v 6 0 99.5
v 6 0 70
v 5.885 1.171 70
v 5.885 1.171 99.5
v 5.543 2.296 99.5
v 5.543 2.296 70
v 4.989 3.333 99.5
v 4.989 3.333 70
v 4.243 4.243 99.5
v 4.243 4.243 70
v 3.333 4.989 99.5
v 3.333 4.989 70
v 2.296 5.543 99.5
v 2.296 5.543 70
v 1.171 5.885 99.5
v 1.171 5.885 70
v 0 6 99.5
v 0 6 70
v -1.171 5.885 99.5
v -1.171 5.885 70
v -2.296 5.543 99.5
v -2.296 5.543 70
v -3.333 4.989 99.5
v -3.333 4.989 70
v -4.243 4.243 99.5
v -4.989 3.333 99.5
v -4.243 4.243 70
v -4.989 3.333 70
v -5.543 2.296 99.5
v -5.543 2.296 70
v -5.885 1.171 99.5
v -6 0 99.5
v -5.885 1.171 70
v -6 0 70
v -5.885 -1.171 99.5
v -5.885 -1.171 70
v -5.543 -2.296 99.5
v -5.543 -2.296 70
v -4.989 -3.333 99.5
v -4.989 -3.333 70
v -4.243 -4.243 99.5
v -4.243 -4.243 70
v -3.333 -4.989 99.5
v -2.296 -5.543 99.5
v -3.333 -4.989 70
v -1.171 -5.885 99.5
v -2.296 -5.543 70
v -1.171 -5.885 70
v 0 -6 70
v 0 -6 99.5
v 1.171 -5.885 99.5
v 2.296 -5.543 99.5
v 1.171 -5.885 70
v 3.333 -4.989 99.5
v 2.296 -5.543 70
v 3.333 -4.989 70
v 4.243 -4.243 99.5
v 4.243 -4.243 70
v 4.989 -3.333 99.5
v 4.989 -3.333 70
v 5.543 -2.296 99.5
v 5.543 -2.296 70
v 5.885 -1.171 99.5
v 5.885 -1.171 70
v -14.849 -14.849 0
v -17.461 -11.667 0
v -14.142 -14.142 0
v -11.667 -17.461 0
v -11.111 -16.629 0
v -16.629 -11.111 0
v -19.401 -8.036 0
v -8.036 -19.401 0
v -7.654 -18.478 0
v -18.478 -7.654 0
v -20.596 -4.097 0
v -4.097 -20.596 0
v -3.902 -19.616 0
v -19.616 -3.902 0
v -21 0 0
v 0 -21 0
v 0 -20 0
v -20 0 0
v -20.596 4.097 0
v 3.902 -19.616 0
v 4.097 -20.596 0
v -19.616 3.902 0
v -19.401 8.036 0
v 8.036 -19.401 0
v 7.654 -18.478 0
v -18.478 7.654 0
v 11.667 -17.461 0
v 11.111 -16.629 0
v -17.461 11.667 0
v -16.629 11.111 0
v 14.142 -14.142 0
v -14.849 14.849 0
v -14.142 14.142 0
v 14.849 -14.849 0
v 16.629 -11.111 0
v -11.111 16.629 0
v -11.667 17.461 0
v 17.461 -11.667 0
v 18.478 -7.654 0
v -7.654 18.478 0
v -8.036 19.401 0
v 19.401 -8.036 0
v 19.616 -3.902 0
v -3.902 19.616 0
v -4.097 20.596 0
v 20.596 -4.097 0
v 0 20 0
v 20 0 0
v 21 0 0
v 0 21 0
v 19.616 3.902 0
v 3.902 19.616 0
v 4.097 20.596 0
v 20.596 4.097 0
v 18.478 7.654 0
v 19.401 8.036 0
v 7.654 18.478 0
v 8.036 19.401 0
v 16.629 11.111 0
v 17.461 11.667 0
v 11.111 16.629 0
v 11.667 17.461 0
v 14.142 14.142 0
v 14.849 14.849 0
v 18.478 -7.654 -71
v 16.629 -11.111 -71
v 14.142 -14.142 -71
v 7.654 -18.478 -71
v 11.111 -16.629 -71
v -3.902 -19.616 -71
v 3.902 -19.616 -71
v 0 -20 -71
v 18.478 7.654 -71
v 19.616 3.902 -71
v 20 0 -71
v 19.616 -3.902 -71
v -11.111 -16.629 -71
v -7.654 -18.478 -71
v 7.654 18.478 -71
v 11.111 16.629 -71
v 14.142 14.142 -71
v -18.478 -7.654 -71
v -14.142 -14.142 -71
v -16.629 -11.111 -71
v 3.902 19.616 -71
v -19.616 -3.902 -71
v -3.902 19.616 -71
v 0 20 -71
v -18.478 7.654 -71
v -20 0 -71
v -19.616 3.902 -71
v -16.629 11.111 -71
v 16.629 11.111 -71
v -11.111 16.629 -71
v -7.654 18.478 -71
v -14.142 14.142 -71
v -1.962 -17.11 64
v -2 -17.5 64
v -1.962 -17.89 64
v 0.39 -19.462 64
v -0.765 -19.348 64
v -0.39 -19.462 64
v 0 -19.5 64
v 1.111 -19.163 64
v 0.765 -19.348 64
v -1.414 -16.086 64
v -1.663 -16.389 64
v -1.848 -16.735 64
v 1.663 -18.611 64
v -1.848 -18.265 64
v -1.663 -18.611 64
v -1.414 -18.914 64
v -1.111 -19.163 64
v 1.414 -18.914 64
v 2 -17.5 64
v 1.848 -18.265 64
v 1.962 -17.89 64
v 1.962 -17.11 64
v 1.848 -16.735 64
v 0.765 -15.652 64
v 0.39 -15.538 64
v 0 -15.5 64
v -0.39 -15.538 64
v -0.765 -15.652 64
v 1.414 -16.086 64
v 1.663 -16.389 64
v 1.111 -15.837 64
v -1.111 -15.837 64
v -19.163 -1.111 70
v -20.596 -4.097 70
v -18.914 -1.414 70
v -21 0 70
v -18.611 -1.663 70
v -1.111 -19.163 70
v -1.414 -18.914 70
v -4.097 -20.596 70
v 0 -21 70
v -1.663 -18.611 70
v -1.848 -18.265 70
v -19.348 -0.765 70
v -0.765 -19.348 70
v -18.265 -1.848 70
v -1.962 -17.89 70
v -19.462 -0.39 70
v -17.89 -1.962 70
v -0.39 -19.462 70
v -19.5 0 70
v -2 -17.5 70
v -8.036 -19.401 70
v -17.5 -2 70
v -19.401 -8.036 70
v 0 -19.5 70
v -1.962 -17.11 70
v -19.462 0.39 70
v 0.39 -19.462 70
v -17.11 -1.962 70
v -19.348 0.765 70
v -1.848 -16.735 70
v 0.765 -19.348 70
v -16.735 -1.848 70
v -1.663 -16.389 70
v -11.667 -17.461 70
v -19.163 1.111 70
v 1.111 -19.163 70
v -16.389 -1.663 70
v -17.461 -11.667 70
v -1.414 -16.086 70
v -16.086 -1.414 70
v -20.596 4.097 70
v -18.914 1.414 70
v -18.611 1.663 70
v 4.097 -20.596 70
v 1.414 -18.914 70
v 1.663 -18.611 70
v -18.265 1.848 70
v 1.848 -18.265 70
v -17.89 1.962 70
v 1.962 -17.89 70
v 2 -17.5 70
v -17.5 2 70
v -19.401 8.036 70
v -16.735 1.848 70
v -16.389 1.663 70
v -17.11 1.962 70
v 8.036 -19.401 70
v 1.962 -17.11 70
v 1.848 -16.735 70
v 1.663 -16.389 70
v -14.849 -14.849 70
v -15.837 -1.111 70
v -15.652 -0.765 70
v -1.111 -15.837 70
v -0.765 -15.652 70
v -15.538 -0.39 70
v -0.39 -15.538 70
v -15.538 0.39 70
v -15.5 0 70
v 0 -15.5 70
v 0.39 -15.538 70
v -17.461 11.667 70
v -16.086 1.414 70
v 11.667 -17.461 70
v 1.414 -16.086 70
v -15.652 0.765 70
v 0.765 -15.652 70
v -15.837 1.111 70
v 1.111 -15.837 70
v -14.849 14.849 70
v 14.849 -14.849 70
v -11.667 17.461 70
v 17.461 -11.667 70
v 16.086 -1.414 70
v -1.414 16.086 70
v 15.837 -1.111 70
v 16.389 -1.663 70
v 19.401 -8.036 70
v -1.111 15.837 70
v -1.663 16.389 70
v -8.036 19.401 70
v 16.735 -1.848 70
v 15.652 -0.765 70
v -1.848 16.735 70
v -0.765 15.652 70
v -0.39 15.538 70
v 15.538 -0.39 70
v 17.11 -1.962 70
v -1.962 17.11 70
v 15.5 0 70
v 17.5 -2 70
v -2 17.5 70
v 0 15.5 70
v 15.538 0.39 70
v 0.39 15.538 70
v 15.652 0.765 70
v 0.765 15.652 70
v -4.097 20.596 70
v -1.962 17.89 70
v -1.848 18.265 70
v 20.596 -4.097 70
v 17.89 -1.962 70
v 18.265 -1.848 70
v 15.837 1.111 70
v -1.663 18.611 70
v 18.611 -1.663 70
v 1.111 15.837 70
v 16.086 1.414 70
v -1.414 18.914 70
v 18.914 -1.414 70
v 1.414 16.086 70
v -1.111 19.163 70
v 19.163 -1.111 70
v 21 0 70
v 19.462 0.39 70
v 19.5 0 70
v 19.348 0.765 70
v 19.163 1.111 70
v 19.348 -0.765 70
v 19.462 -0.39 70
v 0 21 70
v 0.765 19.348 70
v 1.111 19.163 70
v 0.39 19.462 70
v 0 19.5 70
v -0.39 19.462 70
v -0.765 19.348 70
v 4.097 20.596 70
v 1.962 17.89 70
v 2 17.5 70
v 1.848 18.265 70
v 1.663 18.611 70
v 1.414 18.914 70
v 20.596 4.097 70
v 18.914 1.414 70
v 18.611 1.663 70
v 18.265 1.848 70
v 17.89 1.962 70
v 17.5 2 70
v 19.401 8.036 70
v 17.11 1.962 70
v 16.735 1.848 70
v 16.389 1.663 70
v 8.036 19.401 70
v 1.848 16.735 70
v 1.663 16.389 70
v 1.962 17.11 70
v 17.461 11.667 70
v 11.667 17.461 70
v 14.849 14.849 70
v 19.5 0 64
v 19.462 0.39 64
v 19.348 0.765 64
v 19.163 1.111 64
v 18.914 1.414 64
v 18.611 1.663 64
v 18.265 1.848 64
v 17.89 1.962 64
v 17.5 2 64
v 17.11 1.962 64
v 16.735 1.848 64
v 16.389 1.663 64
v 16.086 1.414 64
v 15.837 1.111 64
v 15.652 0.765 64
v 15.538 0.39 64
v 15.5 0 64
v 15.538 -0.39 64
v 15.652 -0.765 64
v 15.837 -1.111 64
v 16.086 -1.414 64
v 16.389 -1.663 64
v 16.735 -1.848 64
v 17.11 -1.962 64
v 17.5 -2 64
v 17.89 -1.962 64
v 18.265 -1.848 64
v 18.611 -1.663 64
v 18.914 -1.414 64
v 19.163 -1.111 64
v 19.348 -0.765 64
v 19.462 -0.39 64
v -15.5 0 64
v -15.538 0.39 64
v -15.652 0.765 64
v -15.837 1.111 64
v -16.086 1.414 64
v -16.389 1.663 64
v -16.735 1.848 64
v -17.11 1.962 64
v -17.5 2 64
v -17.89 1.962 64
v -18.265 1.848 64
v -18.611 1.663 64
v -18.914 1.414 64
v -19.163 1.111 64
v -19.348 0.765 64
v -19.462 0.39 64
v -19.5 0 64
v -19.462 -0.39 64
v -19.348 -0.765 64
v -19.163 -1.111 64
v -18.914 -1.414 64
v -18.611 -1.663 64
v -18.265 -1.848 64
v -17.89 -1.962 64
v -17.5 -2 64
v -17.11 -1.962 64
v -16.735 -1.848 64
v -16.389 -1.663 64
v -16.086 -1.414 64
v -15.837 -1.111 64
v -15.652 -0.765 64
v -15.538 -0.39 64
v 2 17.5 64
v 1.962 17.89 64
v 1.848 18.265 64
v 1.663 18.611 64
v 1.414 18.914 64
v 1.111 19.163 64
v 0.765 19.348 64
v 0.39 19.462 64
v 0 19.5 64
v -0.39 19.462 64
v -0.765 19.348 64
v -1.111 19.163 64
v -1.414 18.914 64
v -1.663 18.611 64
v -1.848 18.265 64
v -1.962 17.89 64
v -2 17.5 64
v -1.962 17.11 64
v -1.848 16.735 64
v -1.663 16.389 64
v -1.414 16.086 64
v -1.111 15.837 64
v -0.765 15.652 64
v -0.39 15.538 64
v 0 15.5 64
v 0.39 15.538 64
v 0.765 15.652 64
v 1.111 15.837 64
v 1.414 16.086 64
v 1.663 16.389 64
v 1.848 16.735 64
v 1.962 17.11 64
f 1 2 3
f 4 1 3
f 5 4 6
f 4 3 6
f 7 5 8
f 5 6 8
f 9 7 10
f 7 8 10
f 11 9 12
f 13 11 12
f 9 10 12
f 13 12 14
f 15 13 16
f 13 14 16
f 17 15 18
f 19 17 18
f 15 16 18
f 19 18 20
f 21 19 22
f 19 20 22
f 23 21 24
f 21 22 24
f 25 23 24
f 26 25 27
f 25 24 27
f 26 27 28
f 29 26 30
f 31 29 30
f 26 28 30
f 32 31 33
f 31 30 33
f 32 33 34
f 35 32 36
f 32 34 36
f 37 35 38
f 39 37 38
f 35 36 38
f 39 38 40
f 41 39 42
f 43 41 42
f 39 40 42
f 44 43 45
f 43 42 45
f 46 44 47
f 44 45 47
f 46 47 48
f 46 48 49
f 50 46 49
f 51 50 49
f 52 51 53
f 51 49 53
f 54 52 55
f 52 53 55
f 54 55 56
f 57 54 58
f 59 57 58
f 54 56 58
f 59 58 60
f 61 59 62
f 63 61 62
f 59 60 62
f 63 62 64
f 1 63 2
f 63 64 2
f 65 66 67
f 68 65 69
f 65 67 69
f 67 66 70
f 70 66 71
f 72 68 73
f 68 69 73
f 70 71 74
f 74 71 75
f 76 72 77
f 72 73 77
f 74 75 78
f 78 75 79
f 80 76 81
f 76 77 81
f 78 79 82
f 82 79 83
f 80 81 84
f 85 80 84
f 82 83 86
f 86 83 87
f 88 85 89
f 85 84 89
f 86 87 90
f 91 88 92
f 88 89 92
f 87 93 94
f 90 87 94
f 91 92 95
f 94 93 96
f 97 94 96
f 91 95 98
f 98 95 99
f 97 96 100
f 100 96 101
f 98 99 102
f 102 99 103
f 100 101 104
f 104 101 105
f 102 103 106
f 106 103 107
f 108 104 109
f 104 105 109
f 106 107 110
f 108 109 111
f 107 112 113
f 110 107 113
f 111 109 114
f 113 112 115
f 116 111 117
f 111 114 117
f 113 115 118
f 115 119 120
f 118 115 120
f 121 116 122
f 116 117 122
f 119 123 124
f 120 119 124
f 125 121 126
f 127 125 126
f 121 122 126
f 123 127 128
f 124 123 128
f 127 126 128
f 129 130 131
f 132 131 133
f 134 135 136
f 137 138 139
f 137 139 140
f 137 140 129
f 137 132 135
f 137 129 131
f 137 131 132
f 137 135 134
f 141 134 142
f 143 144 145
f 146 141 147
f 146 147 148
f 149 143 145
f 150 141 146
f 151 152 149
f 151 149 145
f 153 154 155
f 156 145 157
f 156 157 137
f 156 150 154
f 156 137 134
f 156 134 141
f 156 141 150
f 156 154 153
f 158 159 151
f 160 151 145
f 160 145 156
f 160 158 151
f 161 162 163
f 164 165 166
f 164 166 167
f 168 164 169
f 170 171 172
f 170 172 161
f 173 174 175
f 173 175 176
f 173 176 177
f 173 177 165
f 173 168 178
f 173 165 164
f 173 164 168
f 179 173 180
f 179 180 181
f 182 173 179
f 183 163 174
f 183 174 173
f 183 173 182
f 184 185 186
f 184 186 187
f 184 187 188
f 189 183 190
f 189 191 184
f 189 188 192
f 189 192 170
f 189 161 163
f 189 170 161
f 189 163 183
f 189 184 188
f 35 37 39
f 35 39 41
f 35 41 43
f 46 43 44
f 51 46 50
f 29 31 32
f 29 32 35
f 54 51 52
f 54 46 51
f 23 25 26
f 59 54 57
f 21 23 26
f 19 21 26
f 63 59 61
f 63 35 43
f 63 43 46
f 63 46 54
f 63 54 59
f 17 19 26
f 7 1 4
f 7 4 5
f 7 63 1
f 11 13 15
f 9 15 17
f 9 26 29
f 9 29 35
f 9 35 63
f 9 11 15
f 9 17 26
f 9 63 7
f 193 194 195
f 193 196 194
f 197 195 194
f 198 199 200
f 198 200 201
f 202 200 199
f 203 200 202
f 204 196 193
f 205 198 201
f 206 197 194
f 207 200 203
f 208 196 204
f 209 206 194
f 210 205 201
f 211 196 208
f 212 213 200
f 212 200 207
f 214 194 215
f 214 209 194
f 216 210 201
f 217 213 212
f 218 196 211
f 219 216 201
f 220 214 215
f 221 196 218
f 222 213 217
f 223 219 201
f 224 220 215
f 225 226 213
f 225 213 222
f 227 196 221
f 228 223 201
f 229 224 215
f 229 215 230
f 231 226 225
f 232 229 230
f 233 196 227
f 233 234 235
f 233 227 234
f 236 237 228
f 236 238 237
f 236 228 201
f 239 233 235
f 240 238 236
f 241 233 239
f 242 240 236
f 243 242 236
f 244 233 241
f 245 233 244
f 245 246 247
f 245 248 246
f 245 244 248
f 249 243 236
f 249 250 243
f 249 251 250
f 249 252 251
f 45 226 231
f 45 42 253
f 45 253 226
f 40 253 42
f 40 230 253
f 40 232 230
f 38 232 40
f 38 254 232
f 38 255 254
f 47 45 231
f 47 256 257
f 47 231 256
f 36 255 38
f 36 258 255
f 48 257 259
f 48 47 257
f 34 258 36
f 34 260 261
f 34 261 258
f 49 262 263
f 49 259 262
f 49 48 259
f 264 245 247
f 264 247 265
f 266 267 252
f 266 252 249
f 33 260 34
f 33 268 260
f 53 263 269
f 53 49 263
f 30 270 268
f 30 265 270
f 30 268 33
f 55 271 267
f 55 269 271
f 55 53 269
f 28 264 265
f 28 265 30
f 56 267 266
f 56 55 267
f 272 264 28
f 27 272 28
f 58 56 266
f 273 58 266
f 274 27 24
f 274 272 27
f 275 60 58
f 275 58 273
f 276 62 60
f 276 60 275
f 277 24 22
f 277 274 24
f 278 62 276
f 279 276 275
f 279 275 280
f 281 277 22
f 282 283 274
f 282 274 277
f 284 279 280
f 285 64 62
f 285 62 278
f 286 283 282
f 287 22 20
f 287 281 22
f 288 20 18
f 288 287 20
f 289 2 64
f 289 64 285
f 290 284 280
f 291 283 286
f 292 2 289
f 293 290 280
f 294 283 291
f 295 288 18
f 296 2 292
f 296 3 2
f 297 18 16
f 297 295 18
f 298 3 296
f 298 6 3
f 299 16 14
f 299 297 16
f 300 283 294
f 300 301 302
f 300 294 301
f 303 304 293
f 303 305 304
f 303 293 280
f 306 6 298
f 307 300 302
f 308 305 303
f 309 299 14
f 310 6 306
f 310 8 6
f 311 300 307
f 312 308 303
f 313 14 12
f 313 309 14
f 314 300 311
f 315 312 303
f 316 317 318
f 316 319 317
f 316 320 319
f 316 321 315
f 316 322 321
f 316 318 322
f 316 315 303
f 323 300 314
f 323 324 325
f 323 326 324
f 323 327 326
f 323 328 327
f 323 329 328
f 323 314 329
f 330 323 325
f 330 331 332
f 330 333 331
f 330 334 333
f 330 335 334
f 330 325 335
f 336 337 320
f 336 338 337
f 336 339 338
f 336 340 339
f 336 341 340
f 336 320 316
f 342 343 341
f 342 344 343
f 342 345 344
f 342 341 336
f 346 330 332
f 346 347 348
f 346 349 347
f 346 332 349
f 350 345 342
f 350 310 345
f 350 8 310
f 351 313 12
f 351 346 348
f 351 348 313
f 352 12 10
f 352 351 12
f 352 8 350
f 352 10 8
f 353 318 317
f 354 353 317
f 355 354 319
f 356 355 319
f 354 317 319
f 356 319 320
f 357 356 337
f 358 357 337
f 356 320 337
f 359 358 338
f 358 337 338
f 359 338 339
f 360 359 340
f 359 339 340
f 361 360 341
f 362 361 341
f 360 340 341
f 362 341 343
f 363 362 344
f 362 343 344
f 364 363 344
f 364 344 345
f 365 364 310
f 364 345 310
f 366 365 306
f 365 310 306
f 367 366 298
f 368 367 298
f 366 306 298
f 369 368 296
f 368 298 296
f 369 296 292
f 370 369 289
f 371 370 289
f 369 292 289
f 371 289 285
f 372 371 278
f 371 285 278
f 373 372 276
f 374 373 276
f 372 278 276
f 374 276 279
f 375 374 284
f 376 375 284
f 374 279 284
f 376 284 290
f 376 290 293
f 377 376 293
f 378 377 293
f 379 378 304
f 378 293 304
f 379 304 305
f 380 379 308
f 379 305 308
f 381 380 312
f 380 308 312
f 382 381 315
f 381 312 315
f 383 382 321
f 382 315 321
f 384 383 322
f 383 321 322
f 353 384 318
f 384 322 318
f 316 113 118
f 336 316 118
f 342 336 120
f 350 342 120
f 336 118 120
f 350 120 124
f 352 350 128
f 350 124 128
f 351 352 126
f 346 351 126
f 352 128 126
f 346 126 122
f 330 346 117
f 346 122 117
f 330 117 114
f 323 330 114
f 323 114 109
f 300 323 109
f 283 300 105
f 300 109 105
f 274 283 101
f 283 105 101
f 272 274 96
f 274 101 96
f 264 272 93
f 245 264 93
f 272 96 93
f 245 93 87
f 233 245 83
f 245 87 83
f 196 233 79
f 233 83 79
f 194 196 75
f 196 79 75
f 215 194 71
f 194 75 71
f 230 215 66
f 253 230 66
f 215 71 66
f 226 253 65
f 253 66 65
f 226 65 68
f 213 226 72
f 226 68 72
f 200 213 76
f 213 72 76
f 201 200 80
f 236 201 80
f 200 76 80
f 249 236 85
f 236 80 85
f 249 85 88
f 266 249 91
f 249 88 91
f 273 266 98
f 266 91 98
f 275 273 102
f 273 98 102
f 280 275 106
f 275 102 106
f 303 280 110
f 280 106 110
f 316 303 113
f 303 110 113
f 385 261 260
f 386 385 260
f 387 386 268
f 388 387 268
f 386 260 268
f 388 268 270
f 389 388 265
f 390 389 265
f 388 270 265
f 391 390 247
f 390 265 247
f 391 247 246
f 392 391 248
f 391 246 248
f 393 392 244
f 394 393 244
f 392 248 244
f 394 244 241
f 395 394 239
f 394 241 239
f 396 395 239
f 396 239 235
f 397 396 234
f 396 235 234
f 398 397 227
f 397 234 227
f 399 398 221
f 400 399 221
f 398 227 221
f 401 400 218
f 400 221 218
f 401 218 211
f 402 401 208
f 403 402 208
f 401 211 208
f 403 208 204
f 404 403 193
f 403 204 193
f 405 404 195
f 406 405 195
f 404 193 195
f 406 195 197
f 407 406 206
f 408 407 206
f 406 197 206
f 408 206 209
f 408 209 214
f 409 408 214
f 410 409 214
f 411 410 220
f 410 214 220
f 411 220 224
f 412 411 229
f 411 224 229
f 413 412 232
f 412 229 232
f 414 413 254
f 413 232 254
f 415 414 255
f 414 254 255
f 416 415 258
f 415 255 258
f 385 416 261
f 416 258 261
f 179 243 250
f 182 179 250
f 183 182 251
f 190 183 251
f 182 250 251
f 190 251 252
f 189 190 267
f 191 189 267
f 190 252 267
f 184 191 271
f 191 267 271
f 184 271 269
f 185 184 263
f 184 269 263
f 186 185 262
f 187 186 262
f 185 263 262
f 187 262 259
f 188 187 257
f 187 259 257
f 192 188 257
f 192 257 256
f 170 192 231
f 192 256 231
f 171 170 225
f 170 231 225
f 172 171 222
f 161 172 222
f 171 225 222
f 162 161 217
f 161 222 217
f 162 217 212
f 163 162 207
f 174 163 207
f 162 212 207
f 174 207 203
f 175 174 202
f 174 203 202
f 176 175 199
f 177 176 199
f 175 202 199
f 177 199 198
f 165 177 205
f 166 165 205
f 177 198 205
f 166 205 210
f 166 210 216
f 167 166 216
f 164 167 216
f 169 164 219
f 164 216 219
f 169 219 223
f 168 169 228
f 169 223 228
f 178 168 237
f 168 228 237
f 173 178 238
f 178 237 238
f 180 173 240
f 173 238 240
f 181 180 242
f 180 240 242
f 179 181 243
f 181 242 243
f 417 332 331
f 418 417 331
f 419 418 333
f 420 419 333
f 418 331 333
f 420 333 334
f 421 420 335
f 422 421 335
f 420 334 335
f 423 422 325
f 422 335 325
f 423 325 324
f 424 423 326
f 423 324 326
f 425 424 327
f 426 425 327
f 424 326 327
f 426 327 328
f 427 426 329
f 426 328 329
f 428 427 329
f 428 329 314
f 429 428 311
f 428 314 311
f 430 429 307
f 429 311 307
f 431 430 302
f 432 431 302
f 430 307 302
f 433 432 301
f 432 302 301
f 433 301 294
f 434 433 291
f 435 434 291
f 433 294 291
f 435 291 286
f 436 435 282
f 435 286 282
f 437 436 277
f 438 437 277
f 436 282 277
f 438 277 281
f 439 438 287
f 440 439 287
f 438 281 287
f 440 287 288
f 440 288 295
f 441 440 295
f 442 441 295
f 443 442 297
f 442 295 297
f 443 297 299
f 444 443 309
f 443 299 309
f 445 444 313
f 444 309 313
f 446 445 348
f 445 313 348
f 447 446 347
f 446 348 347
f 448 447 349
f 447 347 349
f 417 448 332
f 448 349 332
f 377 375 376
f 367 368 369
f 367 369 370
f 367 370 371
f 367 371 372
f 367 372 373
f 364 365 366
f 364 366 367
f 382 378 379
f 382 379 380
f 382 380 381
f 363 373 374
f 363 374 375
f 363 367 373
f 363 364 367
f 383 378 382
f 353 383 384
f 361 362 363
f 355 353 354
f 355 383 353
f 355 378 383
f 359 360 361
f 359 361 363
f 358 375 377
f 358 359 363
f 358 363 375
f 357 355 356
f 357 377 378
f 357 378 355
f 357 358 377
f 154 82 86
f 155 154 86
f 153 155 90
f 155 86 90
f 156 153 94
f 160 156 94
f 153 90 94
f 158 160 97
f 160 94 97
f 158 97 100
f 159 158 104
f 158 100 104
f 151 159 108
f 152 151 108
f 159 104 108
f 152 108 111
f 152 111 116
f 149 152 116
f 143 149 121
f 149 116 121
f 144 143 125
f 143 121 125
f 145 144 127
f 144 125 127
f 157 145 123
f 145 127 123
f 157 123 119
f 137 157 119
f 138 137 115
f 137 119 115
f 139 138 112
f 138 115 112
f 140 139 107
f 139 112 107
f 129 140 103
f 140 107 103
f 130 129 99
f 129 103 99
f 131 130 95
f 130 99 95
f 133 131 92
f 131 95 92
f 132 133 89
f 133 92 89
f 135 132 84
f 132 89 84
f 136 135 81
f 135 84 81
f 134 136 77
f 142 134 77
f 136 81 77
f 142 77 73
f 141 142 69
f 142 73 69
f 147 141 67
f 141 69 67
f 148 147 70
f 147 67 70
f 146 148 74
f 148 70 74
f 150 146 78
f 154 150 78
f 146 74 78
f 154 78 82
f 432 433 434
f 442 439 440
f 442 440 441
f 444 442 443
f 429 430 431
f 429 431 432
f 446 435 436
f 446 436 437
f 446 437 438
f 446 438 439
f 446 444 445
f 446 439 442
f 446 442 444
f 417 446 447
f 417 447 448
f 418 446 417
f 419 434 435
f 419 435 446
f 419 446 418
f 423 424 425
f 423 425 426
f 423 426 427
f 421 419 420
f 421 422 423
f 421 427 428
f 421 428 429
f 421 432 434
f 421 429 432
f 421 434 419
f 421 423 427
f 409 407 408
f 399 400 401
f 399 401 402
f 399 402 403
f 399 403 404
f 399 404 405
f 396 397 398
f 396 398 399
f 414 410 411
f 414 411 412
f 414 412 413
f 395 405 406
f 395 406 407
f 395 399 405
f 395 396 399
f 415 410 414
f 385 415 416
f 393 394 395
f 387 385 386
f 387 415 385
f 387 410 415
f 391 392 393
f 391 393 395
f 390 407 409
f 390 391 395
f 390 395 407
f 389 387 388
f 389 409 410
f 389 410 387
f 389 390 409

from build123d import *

# Parameters (mm, degrees)
SZKIC1_R                    = 21
DODANIE_WYCI_GNI_CIE1_DEPTH = 70
SZKIC2_R                    = 2
WYTNIJ_WYCI_GNI_CIE1_DEPTH  = 6
SZKIC3_R                    = 6
DODANIE_WYCI_GNI_CIE2_DEPTH = 29.5
SZKIC4_R                    = 20
DODANIE_WYCI_GNI_CIE3_DEPTH = 71


with BuildPart() as part:
    # Szkic1 → Dodanie-wyciągnięcie1 (new body)
    with BuildSketch(Plane.XY):
        Circle(SZKIC1_R)
    extrude(amount=DODANIE_WYCI_GNI_CIE1_DEPTH)

    # Szkic2 → Wytnij-wyciągnięcie1 (cut)
    with BuildSketch(Plane.XY.offset(70)):
        with Locations((0, 17.5)):
            Circle(SZKIC2_R)
        with Locations((17.5, 0)):
            Circle(SZKIC2_R)
        with Locations((0, -17.5)):
            Circle(SZKIC2_R)
        with Locations((-17.5, 0)):
            Circle(SZKIC2_R)
    extrude(amount=-WYTNIJ_WYCI_GNI_CIE1_DEPTH, mode=Mode.SUBTRACT)

    # Szkic3 → Dodanie-wyciągnięcie2 (add)
    with BuildSketch(Plane.XY.offset(70)):
        Circle(SZKIC3_R)
    extrude(amount=DODANIE_WYCI_GNI_CIE2_DEPTH)

    # Szkic4 → Dodanie-wyciągnięcie3 (add)
    with BuildSketch(Plane(origin=(0, 0, 0), x_dir=(-1, 0, 0), z_dir=(0, 0, -1))):
        Circle(SZKIC4_R)
    extrude(amount=DODANIE_WYCI_GNI_CIE3_DEPTH)


solid = part.part
